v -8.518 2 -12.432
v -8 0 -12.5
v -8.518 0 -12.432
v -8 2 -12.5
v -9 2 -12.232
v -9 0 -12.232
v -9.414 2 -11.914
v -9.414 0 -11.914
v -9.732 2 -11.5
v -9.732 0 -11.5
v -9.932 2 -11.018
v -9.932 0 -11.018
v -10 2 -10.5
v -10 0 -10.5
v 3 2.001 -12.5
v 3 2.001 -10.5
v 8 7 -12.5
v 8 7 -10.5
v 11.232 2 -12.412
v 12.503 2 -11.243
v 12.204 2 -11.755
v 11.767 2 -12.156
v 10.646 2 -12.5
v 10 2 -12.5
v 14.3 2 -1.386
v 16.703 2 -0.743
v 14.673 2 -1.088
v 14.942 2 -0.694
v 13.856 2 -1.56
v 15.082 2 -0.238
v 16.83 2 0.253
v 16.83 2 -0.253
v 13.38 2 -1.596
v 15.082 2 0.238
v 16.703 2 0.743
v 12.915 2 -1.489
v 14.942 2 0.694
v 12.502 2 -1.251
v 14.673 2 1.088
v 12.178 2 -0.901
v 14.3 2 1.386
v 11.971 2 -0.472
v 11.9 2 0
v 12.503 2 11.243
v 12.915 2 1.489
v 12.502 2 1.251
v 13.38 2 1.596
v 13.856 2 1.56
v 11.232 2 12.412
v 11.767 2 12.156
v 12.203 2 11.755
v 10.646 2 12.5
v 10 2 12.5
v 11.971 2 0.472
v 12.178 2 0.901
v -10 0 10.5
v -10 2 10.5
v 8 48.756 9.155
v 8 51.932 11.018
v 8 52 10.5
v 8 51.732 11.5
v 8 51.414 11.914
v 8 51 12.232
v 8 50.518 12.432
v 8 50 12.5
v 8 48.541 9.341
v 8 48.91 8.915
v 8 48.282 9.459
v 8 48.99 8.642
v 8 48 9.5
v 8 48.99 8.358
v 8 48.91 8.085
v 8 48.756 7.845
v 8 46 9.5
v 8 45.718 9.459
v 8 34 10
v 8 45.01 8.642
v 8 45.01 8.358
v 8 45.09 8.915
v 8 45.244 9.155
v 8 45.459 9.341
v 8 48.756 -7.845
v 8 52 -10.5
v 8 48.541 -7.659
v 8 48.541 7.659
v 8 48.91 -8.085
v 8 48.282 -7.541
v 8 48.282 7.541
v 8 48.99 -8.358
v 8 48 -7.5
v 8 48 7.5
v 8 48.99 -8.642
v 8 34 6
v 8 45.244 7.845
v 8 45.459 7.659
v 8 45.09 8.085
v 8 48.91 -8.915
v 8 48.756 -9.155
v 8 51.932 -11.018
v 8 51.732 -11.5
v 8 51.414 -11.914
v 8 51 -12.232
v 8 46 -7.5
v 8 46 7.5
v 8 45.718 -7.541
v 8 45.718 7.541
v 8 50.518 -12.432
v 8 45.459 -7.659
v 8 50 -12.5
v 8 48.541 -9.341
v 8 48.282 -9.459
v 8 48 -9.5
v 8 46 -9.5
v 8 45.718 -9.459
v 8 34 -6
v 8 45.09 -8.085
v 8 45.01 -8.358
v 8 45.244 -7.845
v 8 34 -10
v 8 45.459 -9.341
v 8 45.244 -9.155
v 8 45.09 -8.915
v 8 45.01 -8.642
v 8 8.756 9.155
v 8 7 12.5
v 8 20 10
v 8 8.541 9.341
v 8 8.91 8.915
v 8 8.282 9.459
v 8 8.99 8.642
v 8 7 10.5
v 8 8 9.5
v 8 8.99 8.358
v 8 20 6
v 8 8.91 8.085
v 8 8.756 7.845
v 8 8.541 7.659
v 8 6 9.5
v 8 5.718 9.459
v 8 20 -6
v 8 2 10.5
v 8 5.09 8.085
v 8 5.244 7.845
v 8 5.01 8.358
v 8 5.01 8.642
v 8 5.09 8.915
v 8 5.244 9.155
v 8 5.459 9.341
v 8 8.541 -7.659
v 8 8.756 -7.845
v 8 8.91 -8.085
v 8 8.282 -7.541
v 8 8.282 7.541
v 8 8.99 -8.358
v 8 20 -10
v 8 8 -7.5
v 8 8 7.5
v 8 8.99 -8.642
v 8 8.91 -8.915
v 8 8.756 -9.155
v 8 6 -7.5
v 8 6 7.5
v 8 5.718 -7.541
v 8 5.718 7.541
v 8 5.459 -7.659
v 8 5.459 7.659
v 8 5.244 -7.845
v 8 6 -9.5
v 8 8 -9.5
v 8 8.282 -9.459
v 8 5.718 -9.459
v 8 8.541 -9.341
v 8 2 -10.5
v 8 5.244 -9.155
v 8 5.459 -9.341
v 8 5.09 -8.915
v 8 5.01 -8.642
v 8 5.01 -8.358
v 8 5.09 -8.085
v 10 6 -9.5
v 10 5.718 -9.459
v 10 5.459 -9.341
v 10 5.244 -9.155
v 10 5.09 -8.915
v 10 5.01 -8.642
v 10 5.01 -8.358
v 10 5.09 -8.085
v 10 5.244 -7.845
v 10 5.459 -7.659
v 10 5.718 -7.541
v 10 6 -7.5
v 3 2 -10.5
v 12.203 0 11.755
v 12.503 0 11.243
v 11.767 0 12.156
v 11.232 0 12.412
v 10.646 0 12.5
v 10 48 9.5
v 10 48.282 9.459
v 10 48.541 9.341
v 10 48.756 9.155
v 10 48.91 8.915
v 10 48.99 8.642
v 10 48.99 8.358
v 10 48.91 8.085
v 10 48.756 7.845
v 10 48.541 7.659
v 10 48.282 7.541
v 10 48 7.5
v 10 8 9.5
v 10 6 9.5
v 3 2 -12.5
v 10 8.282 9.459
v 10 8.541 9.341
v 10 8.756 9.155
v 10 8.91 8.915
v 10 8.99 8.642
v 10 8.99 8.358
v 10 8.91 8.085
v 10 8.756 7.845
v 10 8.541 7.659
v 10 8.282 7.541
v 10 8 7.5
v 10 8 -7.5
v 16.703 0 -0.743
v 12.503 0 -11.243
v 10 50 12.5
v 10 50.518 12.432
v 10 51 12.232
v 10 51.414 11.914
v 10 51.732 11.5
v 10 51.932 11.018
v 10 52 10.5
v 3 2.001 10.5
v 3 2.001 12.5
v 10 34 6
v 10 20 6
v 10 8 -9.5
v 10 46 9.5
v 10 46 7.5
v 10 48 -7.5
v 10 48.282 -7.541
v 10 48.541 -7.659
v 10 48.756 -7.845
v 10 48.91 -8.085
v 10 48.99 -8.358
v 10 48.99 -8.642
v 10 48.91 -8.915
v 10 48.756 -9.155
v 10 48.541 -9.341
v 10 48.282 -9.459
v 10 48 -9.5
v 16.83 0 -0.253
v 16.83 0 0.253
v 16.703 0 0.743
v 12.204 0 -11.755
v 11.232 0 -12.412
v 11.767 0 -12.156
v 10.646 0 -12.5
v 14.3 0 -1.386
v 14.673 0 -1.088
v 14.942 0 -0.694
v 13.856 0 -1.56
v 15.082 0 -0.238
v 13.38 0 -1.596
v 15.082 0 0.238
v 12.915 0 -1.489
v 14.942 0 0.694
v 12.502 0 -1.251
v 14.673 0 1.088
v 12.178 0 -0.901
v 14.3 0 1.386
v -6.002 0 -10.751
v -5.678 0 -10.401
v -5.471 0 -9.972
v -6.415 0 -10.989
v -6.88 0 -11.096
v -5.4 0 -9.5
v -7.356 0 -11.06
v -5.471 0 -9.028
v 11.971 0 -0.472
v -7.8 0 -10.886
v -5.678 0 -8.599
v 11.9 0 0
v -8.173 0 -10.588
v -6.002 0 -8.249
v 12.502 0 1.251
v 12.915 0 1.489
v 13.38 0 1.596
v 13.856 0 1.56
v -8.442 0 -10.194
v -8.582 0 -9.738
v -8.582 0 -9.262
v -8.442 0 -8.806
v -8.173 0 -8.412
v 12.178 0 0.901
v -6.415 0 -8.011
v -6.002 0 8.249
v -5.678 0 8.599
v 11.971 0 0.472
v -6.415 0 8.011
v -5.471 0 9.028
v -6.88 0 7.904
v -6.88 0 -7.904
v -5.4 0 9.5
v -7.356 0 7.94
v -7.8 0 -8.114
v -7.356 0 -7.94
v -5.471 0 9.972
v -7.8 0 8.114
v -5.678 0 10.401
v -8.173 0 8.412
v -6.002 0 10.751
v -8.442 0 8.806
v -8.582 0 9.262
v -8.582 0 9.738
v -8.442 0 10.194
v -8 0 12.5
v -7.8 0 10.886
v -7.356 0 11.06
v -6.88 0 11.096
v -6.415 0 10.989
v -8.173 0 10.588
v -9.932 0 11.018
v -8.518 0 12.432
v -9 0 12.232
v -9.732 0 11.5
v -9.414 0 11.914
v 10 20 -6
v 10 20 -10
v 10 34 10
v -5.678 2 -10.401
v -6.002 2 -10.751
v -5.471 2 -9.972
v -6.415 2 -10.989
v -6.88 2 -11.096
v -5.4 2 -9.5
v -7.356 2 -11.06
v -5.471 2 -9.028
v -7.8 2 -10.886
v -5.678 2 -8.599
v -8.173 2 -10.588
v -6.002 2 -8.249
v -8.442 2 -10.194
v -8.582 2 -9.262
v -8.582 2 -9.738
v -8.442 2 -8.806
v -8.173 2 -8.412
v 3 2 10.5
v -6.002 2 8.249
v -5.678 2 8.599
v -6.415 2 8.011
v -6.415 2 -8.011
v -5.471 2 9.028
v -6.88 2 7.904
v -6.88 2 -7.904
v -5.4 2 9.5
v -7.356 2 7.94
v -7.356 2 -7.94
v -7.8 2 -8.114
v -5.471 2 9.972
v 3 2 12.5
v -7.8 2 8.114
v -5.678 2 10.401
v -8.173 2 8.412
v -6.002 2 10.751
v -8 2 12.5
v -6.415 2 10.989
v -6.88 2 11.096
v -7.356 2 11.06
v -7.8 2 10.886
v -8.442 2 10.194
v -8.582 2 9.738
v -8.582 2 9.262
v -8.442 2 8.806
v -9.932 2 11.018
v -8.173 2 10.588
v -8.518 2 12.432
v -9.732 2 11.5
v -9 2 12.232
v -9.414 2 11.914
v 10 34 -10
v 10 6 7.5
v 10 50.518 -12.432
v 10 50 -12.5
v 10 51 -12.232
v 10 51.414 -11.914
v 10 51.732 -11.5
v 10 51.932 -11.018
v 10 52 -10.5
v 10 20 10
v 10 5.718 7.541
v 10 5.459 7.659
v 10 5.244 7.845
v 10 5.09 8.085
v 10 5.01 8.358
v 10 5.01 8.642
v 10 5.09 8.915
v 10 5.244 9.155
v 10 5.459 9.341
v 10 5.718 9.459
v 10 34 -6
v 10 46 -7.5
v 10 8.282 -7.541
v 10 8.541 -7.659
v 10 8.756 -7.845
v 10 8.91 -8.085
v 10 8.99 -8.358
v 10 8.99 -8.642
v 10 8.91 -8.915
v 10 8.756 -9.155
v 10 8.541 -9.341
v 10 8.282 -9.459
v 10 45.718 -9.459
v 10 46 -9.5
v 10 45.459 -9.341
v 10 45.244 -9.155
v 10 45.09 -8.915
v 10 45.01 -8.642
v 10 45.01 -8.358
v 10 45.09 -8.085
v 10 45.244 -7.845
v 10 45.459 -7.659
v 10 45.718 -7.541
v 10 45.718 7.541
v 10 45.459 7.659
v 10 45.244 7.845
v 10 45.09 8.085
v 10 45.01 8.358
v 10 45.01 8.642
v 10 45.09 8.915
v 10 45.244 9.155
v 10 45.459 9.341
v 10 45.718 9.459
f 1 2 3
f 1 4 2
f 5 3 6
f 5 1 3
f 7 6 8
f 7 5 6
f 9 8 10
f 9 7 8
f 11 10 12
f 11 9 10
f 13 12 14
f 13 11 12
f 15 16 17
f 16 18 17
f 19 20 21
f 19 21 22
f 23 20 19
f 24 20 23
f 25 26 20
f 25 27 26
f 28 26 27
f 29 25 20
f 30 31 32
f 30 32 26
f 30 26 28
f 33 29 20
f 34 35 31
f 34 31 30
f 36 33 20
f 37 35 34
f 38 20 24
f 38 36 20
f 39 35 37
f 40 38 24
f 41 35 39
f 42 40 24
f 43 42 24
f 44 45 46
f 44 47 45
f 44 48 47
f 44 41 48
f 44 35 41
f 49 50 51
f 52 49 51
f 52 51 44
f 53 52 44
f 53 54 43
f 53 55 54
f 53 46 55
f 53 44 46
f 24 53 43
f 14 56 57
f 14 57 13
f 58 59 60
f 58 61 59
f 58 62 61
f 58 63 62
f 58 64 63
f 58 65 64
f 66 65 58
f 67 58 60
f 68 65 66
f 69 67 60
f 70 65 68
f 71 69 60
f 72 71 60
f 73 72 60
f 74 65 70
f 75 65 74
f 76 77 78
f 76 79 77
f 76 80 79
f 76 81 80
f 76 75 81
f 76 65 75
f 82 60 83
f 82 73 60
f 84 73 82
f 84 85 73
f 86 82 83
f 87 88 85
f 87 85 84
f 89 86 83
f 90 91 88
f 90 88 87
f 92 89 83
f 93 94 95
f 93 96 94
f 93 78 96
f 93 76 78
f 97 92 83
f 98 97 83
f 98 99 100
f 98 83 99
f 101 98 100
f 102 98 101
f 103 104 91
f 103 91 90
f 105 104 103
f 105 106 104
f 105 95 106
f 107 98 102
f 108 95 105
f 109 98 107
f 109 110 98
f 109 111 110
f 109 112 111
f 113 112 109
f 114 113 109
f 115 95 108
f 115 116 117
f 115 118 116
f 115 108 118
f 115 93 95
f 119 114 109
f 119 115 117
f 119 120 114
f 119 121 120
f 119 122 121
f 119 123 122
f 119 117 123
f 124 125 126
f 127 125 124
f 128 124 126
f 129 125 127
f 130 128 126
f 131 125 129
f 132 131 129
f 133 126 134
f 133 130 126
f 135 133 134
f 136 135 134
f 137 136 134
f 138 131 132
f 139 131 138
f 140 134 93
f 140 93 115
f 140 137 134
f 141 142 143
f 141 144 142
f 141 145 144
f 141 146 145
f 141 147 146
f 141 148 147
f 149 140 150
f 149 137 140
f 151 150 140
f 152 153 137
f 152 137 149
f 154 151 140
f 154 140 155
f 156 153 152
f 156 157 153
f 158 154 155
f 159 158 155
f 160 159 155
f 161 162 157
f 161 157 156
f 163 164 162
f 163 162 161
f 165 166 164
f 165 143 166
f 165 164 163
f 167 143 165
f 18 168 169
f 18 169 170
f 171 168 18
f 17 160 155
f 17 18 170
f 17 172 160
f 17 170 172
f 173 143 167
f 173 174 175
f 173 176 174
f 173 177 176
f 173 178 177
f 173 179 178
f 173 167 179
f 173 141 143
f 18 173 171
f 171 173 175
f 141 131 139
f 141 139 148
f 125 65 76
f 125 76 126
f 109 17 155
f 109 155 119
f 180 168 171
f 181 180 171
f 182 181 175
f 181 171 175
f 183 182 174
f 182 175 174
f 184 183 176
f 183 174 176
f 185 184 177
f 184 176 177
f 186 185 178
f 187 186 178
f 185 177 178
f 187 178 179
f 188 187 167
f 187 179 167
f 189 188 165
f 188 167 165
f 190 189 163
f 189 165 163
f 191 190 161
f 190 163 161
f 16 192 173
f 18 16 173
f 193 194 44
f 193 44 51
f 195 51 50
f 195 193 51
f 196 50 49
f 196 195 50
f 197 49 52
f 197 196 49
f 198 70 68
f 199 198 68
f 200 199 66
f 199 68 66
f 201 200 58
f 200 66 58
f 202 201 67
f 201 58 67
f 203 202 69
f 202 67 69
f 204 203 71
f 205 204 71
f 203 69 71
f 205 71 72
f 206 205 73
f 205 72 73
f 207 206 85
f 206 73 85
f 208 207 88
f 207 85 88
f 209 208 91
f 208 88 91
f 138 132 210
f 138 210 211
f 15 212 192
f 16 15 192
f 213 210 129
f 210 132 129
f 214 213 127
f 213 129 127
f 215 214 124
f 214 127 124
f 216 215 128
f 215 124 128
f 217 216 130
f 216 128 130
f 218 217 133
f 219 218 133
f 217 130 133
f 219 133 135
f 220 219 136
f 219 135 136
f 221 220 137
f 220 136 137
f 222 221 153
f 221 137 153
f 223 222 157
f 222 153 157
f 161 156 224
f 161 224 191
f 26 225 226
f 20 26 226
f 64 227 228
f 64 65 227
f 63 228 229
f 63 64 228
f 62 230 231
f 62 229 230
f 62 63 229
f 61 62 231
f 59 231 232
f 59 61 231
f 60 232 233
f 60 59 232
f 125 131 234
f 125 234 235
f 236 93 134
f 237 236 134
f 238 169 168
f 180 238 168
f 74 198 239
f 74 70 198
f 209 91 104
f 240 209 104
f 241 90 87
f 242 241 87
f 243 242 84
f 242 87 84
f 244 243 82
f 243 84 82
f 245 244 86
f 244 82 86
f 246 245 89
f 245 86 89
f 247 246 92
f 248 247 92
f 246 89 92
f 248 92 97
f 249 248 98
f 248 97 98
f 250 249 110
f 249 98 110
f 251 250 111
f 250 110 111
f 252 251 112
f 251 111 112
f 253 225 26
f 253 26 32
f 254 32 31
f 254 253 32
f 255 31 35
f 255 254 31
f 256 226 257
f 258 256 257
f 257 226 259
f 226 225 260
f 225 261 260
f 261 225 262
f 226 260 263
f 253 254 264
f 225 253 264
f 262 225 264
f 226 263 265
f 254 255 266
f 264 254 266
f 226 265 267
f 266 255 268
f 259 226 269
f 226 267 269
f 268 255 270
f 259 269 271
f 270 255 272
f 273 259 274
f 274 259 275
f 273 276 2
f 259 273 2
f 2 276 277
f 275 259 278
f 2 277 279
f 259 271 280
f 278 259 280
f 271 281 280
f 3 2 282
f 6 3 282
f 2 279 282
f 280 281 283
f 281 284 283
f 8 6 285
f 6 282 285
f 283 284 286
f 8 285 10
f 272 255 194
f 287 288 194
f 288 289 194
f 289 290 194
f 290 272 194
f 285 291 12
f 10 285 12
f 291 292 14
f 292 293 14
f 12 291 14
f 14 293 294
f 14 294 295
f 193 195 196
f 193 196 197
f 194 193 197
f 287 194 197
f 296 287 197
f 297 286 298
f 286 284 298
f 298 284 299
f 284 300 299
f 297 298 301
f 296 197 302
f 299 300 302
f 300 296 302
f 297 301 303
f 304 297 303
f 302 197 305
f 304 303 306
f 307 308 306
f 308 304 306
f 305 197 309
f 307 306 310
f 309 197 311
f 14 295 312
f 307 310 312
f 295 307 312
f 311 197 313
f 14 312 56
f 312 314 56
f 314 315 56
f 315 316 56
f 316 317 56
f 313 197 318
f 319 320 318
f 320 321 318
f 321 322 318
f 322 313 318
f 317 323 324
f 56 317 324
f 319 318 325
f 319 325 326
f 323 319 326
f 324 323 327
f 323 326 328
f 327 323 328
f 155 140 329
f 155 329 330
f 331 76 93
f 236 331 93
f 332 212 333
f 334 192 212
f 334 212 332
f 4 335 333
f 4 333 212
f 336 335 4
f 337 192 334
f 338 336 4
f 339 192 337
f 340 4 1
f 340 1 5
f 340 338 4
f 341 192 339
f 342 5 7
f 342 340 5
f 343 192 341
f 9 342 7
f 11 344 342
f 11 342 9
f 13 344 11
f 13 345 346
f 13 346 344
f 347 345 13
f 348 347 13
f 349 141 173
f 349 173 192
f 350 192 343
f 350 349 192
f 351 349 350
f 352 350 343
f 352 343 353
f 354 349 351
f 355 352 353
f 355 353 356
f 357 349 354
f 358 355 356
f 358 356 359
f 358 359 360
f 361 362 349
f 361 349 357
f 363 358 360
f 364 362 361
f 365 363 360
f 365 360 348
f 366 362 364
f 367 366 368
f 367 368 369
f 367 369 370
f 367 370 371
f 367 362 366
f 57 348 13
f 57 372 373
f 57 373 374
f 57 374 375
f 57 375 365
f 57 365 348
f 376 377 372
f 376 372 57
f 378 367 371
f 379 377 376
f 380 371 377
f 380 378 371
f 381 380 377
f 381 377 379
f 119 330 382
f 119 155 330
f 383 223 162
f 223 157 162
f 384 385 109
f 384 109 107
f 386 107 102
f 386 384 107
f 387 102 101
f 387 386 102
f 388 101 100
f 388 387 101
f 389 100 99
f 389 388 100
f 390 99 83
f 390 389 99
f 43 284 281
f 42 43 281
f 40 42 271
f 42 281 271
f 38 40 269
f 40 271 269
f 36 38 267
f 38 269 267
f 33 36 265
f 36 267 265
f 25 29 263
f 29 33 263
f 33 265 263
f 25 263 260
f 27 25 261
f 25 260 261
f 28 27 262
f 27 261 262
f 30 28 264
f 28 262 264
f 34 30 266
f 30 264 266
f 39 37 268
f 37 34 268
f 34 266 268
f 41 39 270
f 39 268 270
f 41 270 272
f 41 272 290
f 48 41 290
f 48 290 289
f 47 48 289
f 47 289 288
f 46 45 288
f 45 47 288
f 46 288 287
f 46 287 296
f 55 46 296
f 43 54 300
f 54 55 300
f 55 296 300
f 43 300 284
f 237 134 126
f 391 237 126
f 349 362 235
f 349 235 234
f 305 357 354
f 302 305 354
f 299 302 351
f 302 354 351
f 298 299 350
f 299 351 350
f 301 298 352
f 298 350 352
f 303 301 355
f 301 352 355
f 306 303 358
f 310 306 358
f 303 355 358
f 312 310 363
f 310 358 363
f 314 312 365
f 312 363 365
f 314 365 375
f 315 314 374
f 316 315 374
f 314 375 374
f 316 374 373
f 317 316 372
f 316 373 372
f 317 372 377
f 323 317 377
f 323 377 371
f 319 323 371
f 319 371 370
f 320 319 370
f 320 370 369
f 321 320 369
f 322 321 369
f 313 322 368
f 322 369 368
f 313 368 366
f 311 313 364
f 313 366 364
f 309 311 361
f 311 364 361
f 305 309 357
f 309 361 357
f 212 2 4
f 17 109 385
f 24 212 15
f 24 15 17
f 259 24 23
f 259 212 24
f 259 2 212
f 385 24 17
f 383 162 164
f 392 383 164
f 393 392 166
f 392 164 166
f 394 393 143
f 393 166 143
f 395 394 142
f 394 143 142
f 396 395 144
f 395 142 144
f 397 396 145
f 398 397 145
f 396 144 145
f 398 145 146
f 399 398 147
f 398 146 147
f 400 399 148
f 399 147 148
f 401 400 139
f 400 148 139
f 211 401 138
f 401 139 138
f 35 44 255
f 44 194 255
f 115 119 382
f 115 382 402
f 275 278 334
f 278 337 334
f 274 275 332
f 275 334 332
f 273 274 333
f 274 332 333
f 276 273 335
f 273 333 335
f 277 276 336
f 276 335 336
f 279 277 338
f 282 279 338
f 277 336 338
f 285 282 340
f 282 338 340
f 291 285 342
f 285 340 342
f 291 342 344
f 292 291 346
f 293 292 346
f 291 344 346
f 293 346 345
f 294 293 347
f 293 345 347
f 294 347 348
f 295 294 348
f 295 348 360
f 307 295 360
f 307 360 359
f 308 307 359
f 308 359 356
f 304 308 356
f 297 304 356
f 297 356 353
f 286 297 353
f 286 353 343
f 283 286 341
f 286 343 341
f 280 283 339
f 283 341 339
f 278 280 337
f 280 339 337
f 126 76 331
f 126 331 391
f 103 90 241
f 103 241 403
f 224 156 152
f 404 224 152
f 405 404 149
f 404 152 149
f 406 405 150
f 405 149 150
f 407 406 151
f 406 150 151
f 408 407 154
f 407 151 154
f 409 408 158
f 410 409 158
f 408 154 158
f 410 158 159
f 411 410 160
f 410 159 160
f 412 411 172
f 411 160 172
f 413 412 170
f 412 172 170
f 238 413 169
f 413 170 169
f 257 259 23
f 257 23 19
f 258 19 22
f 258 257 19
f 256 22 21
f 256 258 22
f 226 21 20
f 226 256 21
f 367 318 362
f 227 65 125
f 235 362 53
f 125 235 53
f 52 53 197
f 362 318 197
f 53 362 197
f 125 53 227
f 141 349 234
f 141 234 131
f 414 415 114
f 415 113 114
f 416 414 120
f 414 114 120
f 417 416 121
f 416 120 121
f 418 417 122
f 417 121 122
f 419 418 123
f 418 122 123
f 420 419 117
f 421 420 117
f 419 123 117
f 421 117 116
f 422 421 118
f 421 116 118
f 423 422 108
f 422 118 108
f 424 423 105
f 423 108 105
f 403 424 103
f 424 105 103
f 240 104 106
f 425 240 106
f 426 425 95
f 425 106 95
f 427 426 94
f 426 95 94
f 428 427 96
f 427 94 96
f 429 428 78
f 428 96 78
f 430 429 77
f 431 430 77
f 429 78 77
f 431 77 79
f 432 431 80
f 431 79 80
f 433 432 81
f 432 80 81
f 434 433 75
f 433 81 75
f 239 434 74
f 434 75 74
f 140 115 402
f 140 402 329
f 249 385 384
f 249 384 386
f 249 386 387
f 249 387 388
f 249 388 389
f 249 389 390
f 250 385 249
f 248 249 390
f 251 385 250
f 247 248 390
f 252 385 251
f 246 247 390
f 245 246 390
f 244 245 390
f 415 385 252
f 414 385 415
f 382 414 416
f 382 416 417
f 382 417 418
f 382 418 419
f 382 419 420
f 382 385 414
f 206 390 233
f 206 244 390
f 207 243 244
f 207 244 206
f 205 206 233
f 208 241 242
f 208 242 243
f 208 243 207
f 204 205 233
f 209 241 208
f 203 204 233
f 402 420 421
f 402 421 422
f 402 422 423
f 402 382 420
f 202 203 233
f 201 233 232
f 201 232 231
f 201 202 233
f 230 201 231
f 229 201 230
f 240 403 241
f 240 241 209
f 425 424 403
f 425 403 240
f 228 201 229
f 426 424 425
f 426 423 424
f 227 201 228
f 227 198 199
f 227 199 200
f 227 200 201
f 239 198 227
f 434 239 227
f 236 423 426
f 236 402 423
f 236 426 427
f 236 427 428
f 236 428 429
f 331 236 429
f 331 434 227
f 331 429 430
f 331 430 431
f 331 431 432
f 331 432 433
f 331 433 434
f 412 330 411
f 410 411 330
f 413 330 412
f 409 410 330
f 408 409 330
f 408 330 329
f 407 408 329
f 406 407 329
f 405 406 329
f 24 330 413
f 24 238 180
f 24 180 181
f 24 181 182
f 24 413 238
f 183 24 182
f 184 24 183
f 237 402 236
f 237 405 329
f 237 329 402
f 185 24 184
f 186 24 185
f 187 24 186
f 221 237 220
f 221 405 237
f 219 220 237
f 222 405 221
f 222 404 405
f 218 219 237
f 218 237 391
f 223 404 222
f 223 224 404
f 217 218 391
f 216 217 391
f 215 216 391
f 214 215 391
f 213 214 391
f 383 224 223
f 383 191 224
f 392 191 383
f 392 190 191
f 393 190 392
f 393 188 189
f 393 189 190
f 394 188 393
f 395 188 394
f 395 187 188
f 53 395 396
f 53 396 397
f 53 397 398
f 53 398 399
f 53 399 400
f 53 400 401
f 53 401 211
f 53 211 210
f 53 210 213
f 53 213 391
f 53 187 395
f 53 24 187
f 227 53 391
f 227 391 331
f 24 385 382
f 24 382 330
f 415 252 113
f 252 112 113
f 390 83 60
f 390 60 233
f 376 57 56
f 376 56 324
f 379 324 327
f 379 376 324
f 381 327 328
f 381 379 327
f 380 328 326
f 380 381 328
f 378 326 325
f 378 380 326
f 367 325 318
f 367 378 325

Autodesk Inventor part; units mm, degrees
ref_plane "YZ Plane" through (0, 0, 0) normal (1, 0, 0) x (0, 1, 0)
ref_plane "XZ Plane" through (0, 0, 0) normal (0, 1, 0) x (-1, 0, 0)
ref_plane "XY Plane" through (0, 0, 0) normal (0, 0, 1) x (1, 0, 0)
sketch "Sketch1" plane through (0, 0, 0) normal (0, 1, 0) x (-1, 0, 0)
  line L0 (-10, -12.5) -> (-10, 12.5)
  line L1 (-10, 12.5) -> (10, 12.5)
  line L2 (10, 12.5) -> (10, -12.5)
  line L3 (10, -12.5) -> (-10, -12.5)
  line L4 (-10, -12.5) -> (10, 12.5) construction
  line L5 (-10, 12.5) -> (10, -12.5) construction
  line L6 (-10, -12.5) -> (-10.6459, -12.5)
  line L7 (-10, 12.5) -> (-10.6459, 12.5)
  line L8 (-16.7029, -0.7428) -> (-12.5029, -11.2428)
  line L9 (-12.5029, 11.2428) -> (-16.7029, 0.7428)
  circle A0 centre (-13.5, 0) radius 1.6
  arc A1 (-16.7029, 0.7428) -> (-16.7029, -0.7428) centre (-14.8459, 0) ccw
  arc A2 (-10.6459, 12.5) -> (-12.5029, 11.2428) centre (-10.6459, 10.5) ccw
  arc A3 (-12.5029, -11.2428) -> (-10.6459, -12.5) centre (-10.6459, -10.5) ccw
  point P0 (0, 0)
  point P1 (-12, -12.5)
  point P2 (-12, 12.5)
  dimension "d1" = 20
  dimension "d63" = 2
  dimension "d64" = 2
  dimension "d66" = 3.2
  dimension "d67" = 2
extrude "Extrusion1" add sketch "Sketch1" along normal blind 2
sketch "Sketch2" plane through (0, 2, 0) normal (0, 1, 0) x (1, 0, 0)
  line L0 (10, 12.5) -> (10, -12.5)
  line L1 (10, -12.5) -> (8, -12.5)
  line L2 (8, -12.5) -> (8, 12.5)
  line L3 (8, 12.5) -> (10, 12.5)
  line L4 (10, -12.5) -> (10, 12.5)
  point P0 (0, 0)
  dimension "d4" = 2
extrude "Extrusion2" add sketch "Sketch2" along normal blind 50
sketch "Sketch3" plane through (8, 2, -12.5) normal (-1, 0, 0) x (0, 0, 1)
  line L0 (0, 0) -> (25, 0) projected
  line L1 (2.5, 2.5) -> (2.5, 47.5)
  line L2 (2.5, 47.5) -> (22.5, 47.5)
  line L3 (22.5, 47.5) -> (22.5, 2.5)
  line L4 (22.5, 2.5) -> (2.5, 2.5)
  line L5 (2.5, 2.5) -> (4, 2.5)
  line L6 (22.5, 2.5) -> (21, 2.5)
  line L7 (22.5, 25) -> (22.5, 32)
  line L8 (22.5, 32) -> (18.5, 32)
  line L9 (18.5, 32) -> (18.5, 18)
  line L10 (18.5, 18) -> (22.5, 18)
  line L11 (2.5, 25) -> (2.5, 32)
  line L12 (2.5, 32) -> (6.5, 32)
  line L13 (6.5, 32) -> (6.5, 18)
  line L14 (6.5, 18) -> (2.5, 18)
  line L15 (3, 46) -> (3, 44)
  line L16 (5, 46) -> (5, 44)
  arc A0 (5, 46) -> (3, 46) centre (4, 46) ccw
  arc A1 (3, 44) -> (5, 44) centre (4, 44) ccw
  line L17 (20, 46) -> (20, 44)
  line L18 (22, 46) -> (22, 44)
  arc A2 (22, 46) -> (20, 46) centre (21, 46) ccw
  arc A3 (20, 44) -> (22, 44) centre (21, 44) ccw
  line L19 (3, 6) -> (3, 4)
  line L20 (5, 6) -> (5, 4)
  arc A4 (5, 6) -> (3, 6) centre (4, 6) ccw
  arc A5 (3, 4) -> (5, 4) centre (4, 4) ccw
  line L21 (20, 6) -> (20, 4)
  line L22 (22, 6) -> (22, 4)
  arc A6 (22, 6) -> (20, 6) centre (21, 6) ccw
  arc A7 (20, 4) -> (22, 4) centre (21, 4) ccw
  point P0 (12.5, -2)
  point P1 (2.5, 43)
  point P2 (22.5, 43)
  point P3 (2.5, 7)
  point P4 (22.5, 7)
  dimension "d10" = 45
  dimension "d11" = 20
  dimension "d42" = 4
  dimension "d43" = 14
  dimension "d44" = 2
  dimension "d45" = 2
  dimension "d46" = 2
  dimension "d47" = 2
  dimension "d48" = 2
  dimension "d49" = 2
  dimension "d50" = 2
  dimension "d51" = 2
extrude "Extrusion3" cut sketch "Sketch3" against normal blind 2 contours L1 L12 L13 L14 | L10 L9 L8 L3 | A0 L16 A1 L15 | A2 L18 A3 L17 | A4 L20 A5 L19 | A6 L22 A7 L21
sketch "Sketch5" plane through (0, 2, 0) normal (0, 1, 0) x (1, 0, 0)
  line L0 (10.6459, 12.5) -> (-10, 12.5) projected
  line L1 (8, 12.5) -> (3, 12.5)
  line L2 (3, 12.5) -> (3, 10.5)
  line L3 (3, 10.5) -> (8, 10.5)
  line L4 (8, 10.5) -> (8, 12.5)
  line L5 (-10, -12.5) -> (8, -12.5) projected
  line L6 (8, -12.5) -> (3, -12.5)
  line L7 (3, -12.5) -> (3, -10.5)
  line L8 (3, -10.5) -> (8, -10.5)
  line L9 (8, -10.5) -> (8, -12.5)
  point P0 (0, 0)
  point P1 (10, 12.5)
  point P2 (10.9055, 12.5)
  dimension "d22" = 5
  dimension "d23" = 2
  dimension "d24" = 5
  dimension "d25" = 2
extrude "Extrusion4" add sketch "Sketch5" along normal blind 5
chamfer "Chamfer1" distance 5 angle 45 2 edges at (3, 7, -11.5) (3, 7, 11.5)
sketch "Sketch6" plane through (0, 2, 0) normal (0, 1, 0) x (1, 0, 0)
  line L0 (-10, -12.5) -> (-7, -12.5)
  line L1 (-10, -12.5) -> (3, -12.5) projected
  line L2 (-7, -12.5) -> (-7, -9.5)
  circle A0 centre (-7, -9.5) radius 1.6
  line L3 (-10, 12.5) -> (-7, 12.5)
  line L4 (3, 12.5) -> (-10, 12.5) projected
  line L5 (-7, 12.5) -> (-7, 9.5)
  circle A1 centre (-7, 9.5) radius 1.6
  point P0 (0, 0)
  dimension "d31" = 3
  dimension "d32" = 3
  dimension "d33" = 3.2
  dimension "d34" = 3
  dimension "d35" = 3
  dimension "d36" = 3.2
extrude "Extrusion5" cut sketch "Sketch6" against normal blind 5
fillet "Fillet1" radius 2 4 edges at (-10, 1, 12.5) (-10, 1, -12.5) (9, 52, 12.5) (9, 52, -12.5)
equation "\"d20\" = d49"
properties part number "Sonar Mount" material "ABS Plastic"
